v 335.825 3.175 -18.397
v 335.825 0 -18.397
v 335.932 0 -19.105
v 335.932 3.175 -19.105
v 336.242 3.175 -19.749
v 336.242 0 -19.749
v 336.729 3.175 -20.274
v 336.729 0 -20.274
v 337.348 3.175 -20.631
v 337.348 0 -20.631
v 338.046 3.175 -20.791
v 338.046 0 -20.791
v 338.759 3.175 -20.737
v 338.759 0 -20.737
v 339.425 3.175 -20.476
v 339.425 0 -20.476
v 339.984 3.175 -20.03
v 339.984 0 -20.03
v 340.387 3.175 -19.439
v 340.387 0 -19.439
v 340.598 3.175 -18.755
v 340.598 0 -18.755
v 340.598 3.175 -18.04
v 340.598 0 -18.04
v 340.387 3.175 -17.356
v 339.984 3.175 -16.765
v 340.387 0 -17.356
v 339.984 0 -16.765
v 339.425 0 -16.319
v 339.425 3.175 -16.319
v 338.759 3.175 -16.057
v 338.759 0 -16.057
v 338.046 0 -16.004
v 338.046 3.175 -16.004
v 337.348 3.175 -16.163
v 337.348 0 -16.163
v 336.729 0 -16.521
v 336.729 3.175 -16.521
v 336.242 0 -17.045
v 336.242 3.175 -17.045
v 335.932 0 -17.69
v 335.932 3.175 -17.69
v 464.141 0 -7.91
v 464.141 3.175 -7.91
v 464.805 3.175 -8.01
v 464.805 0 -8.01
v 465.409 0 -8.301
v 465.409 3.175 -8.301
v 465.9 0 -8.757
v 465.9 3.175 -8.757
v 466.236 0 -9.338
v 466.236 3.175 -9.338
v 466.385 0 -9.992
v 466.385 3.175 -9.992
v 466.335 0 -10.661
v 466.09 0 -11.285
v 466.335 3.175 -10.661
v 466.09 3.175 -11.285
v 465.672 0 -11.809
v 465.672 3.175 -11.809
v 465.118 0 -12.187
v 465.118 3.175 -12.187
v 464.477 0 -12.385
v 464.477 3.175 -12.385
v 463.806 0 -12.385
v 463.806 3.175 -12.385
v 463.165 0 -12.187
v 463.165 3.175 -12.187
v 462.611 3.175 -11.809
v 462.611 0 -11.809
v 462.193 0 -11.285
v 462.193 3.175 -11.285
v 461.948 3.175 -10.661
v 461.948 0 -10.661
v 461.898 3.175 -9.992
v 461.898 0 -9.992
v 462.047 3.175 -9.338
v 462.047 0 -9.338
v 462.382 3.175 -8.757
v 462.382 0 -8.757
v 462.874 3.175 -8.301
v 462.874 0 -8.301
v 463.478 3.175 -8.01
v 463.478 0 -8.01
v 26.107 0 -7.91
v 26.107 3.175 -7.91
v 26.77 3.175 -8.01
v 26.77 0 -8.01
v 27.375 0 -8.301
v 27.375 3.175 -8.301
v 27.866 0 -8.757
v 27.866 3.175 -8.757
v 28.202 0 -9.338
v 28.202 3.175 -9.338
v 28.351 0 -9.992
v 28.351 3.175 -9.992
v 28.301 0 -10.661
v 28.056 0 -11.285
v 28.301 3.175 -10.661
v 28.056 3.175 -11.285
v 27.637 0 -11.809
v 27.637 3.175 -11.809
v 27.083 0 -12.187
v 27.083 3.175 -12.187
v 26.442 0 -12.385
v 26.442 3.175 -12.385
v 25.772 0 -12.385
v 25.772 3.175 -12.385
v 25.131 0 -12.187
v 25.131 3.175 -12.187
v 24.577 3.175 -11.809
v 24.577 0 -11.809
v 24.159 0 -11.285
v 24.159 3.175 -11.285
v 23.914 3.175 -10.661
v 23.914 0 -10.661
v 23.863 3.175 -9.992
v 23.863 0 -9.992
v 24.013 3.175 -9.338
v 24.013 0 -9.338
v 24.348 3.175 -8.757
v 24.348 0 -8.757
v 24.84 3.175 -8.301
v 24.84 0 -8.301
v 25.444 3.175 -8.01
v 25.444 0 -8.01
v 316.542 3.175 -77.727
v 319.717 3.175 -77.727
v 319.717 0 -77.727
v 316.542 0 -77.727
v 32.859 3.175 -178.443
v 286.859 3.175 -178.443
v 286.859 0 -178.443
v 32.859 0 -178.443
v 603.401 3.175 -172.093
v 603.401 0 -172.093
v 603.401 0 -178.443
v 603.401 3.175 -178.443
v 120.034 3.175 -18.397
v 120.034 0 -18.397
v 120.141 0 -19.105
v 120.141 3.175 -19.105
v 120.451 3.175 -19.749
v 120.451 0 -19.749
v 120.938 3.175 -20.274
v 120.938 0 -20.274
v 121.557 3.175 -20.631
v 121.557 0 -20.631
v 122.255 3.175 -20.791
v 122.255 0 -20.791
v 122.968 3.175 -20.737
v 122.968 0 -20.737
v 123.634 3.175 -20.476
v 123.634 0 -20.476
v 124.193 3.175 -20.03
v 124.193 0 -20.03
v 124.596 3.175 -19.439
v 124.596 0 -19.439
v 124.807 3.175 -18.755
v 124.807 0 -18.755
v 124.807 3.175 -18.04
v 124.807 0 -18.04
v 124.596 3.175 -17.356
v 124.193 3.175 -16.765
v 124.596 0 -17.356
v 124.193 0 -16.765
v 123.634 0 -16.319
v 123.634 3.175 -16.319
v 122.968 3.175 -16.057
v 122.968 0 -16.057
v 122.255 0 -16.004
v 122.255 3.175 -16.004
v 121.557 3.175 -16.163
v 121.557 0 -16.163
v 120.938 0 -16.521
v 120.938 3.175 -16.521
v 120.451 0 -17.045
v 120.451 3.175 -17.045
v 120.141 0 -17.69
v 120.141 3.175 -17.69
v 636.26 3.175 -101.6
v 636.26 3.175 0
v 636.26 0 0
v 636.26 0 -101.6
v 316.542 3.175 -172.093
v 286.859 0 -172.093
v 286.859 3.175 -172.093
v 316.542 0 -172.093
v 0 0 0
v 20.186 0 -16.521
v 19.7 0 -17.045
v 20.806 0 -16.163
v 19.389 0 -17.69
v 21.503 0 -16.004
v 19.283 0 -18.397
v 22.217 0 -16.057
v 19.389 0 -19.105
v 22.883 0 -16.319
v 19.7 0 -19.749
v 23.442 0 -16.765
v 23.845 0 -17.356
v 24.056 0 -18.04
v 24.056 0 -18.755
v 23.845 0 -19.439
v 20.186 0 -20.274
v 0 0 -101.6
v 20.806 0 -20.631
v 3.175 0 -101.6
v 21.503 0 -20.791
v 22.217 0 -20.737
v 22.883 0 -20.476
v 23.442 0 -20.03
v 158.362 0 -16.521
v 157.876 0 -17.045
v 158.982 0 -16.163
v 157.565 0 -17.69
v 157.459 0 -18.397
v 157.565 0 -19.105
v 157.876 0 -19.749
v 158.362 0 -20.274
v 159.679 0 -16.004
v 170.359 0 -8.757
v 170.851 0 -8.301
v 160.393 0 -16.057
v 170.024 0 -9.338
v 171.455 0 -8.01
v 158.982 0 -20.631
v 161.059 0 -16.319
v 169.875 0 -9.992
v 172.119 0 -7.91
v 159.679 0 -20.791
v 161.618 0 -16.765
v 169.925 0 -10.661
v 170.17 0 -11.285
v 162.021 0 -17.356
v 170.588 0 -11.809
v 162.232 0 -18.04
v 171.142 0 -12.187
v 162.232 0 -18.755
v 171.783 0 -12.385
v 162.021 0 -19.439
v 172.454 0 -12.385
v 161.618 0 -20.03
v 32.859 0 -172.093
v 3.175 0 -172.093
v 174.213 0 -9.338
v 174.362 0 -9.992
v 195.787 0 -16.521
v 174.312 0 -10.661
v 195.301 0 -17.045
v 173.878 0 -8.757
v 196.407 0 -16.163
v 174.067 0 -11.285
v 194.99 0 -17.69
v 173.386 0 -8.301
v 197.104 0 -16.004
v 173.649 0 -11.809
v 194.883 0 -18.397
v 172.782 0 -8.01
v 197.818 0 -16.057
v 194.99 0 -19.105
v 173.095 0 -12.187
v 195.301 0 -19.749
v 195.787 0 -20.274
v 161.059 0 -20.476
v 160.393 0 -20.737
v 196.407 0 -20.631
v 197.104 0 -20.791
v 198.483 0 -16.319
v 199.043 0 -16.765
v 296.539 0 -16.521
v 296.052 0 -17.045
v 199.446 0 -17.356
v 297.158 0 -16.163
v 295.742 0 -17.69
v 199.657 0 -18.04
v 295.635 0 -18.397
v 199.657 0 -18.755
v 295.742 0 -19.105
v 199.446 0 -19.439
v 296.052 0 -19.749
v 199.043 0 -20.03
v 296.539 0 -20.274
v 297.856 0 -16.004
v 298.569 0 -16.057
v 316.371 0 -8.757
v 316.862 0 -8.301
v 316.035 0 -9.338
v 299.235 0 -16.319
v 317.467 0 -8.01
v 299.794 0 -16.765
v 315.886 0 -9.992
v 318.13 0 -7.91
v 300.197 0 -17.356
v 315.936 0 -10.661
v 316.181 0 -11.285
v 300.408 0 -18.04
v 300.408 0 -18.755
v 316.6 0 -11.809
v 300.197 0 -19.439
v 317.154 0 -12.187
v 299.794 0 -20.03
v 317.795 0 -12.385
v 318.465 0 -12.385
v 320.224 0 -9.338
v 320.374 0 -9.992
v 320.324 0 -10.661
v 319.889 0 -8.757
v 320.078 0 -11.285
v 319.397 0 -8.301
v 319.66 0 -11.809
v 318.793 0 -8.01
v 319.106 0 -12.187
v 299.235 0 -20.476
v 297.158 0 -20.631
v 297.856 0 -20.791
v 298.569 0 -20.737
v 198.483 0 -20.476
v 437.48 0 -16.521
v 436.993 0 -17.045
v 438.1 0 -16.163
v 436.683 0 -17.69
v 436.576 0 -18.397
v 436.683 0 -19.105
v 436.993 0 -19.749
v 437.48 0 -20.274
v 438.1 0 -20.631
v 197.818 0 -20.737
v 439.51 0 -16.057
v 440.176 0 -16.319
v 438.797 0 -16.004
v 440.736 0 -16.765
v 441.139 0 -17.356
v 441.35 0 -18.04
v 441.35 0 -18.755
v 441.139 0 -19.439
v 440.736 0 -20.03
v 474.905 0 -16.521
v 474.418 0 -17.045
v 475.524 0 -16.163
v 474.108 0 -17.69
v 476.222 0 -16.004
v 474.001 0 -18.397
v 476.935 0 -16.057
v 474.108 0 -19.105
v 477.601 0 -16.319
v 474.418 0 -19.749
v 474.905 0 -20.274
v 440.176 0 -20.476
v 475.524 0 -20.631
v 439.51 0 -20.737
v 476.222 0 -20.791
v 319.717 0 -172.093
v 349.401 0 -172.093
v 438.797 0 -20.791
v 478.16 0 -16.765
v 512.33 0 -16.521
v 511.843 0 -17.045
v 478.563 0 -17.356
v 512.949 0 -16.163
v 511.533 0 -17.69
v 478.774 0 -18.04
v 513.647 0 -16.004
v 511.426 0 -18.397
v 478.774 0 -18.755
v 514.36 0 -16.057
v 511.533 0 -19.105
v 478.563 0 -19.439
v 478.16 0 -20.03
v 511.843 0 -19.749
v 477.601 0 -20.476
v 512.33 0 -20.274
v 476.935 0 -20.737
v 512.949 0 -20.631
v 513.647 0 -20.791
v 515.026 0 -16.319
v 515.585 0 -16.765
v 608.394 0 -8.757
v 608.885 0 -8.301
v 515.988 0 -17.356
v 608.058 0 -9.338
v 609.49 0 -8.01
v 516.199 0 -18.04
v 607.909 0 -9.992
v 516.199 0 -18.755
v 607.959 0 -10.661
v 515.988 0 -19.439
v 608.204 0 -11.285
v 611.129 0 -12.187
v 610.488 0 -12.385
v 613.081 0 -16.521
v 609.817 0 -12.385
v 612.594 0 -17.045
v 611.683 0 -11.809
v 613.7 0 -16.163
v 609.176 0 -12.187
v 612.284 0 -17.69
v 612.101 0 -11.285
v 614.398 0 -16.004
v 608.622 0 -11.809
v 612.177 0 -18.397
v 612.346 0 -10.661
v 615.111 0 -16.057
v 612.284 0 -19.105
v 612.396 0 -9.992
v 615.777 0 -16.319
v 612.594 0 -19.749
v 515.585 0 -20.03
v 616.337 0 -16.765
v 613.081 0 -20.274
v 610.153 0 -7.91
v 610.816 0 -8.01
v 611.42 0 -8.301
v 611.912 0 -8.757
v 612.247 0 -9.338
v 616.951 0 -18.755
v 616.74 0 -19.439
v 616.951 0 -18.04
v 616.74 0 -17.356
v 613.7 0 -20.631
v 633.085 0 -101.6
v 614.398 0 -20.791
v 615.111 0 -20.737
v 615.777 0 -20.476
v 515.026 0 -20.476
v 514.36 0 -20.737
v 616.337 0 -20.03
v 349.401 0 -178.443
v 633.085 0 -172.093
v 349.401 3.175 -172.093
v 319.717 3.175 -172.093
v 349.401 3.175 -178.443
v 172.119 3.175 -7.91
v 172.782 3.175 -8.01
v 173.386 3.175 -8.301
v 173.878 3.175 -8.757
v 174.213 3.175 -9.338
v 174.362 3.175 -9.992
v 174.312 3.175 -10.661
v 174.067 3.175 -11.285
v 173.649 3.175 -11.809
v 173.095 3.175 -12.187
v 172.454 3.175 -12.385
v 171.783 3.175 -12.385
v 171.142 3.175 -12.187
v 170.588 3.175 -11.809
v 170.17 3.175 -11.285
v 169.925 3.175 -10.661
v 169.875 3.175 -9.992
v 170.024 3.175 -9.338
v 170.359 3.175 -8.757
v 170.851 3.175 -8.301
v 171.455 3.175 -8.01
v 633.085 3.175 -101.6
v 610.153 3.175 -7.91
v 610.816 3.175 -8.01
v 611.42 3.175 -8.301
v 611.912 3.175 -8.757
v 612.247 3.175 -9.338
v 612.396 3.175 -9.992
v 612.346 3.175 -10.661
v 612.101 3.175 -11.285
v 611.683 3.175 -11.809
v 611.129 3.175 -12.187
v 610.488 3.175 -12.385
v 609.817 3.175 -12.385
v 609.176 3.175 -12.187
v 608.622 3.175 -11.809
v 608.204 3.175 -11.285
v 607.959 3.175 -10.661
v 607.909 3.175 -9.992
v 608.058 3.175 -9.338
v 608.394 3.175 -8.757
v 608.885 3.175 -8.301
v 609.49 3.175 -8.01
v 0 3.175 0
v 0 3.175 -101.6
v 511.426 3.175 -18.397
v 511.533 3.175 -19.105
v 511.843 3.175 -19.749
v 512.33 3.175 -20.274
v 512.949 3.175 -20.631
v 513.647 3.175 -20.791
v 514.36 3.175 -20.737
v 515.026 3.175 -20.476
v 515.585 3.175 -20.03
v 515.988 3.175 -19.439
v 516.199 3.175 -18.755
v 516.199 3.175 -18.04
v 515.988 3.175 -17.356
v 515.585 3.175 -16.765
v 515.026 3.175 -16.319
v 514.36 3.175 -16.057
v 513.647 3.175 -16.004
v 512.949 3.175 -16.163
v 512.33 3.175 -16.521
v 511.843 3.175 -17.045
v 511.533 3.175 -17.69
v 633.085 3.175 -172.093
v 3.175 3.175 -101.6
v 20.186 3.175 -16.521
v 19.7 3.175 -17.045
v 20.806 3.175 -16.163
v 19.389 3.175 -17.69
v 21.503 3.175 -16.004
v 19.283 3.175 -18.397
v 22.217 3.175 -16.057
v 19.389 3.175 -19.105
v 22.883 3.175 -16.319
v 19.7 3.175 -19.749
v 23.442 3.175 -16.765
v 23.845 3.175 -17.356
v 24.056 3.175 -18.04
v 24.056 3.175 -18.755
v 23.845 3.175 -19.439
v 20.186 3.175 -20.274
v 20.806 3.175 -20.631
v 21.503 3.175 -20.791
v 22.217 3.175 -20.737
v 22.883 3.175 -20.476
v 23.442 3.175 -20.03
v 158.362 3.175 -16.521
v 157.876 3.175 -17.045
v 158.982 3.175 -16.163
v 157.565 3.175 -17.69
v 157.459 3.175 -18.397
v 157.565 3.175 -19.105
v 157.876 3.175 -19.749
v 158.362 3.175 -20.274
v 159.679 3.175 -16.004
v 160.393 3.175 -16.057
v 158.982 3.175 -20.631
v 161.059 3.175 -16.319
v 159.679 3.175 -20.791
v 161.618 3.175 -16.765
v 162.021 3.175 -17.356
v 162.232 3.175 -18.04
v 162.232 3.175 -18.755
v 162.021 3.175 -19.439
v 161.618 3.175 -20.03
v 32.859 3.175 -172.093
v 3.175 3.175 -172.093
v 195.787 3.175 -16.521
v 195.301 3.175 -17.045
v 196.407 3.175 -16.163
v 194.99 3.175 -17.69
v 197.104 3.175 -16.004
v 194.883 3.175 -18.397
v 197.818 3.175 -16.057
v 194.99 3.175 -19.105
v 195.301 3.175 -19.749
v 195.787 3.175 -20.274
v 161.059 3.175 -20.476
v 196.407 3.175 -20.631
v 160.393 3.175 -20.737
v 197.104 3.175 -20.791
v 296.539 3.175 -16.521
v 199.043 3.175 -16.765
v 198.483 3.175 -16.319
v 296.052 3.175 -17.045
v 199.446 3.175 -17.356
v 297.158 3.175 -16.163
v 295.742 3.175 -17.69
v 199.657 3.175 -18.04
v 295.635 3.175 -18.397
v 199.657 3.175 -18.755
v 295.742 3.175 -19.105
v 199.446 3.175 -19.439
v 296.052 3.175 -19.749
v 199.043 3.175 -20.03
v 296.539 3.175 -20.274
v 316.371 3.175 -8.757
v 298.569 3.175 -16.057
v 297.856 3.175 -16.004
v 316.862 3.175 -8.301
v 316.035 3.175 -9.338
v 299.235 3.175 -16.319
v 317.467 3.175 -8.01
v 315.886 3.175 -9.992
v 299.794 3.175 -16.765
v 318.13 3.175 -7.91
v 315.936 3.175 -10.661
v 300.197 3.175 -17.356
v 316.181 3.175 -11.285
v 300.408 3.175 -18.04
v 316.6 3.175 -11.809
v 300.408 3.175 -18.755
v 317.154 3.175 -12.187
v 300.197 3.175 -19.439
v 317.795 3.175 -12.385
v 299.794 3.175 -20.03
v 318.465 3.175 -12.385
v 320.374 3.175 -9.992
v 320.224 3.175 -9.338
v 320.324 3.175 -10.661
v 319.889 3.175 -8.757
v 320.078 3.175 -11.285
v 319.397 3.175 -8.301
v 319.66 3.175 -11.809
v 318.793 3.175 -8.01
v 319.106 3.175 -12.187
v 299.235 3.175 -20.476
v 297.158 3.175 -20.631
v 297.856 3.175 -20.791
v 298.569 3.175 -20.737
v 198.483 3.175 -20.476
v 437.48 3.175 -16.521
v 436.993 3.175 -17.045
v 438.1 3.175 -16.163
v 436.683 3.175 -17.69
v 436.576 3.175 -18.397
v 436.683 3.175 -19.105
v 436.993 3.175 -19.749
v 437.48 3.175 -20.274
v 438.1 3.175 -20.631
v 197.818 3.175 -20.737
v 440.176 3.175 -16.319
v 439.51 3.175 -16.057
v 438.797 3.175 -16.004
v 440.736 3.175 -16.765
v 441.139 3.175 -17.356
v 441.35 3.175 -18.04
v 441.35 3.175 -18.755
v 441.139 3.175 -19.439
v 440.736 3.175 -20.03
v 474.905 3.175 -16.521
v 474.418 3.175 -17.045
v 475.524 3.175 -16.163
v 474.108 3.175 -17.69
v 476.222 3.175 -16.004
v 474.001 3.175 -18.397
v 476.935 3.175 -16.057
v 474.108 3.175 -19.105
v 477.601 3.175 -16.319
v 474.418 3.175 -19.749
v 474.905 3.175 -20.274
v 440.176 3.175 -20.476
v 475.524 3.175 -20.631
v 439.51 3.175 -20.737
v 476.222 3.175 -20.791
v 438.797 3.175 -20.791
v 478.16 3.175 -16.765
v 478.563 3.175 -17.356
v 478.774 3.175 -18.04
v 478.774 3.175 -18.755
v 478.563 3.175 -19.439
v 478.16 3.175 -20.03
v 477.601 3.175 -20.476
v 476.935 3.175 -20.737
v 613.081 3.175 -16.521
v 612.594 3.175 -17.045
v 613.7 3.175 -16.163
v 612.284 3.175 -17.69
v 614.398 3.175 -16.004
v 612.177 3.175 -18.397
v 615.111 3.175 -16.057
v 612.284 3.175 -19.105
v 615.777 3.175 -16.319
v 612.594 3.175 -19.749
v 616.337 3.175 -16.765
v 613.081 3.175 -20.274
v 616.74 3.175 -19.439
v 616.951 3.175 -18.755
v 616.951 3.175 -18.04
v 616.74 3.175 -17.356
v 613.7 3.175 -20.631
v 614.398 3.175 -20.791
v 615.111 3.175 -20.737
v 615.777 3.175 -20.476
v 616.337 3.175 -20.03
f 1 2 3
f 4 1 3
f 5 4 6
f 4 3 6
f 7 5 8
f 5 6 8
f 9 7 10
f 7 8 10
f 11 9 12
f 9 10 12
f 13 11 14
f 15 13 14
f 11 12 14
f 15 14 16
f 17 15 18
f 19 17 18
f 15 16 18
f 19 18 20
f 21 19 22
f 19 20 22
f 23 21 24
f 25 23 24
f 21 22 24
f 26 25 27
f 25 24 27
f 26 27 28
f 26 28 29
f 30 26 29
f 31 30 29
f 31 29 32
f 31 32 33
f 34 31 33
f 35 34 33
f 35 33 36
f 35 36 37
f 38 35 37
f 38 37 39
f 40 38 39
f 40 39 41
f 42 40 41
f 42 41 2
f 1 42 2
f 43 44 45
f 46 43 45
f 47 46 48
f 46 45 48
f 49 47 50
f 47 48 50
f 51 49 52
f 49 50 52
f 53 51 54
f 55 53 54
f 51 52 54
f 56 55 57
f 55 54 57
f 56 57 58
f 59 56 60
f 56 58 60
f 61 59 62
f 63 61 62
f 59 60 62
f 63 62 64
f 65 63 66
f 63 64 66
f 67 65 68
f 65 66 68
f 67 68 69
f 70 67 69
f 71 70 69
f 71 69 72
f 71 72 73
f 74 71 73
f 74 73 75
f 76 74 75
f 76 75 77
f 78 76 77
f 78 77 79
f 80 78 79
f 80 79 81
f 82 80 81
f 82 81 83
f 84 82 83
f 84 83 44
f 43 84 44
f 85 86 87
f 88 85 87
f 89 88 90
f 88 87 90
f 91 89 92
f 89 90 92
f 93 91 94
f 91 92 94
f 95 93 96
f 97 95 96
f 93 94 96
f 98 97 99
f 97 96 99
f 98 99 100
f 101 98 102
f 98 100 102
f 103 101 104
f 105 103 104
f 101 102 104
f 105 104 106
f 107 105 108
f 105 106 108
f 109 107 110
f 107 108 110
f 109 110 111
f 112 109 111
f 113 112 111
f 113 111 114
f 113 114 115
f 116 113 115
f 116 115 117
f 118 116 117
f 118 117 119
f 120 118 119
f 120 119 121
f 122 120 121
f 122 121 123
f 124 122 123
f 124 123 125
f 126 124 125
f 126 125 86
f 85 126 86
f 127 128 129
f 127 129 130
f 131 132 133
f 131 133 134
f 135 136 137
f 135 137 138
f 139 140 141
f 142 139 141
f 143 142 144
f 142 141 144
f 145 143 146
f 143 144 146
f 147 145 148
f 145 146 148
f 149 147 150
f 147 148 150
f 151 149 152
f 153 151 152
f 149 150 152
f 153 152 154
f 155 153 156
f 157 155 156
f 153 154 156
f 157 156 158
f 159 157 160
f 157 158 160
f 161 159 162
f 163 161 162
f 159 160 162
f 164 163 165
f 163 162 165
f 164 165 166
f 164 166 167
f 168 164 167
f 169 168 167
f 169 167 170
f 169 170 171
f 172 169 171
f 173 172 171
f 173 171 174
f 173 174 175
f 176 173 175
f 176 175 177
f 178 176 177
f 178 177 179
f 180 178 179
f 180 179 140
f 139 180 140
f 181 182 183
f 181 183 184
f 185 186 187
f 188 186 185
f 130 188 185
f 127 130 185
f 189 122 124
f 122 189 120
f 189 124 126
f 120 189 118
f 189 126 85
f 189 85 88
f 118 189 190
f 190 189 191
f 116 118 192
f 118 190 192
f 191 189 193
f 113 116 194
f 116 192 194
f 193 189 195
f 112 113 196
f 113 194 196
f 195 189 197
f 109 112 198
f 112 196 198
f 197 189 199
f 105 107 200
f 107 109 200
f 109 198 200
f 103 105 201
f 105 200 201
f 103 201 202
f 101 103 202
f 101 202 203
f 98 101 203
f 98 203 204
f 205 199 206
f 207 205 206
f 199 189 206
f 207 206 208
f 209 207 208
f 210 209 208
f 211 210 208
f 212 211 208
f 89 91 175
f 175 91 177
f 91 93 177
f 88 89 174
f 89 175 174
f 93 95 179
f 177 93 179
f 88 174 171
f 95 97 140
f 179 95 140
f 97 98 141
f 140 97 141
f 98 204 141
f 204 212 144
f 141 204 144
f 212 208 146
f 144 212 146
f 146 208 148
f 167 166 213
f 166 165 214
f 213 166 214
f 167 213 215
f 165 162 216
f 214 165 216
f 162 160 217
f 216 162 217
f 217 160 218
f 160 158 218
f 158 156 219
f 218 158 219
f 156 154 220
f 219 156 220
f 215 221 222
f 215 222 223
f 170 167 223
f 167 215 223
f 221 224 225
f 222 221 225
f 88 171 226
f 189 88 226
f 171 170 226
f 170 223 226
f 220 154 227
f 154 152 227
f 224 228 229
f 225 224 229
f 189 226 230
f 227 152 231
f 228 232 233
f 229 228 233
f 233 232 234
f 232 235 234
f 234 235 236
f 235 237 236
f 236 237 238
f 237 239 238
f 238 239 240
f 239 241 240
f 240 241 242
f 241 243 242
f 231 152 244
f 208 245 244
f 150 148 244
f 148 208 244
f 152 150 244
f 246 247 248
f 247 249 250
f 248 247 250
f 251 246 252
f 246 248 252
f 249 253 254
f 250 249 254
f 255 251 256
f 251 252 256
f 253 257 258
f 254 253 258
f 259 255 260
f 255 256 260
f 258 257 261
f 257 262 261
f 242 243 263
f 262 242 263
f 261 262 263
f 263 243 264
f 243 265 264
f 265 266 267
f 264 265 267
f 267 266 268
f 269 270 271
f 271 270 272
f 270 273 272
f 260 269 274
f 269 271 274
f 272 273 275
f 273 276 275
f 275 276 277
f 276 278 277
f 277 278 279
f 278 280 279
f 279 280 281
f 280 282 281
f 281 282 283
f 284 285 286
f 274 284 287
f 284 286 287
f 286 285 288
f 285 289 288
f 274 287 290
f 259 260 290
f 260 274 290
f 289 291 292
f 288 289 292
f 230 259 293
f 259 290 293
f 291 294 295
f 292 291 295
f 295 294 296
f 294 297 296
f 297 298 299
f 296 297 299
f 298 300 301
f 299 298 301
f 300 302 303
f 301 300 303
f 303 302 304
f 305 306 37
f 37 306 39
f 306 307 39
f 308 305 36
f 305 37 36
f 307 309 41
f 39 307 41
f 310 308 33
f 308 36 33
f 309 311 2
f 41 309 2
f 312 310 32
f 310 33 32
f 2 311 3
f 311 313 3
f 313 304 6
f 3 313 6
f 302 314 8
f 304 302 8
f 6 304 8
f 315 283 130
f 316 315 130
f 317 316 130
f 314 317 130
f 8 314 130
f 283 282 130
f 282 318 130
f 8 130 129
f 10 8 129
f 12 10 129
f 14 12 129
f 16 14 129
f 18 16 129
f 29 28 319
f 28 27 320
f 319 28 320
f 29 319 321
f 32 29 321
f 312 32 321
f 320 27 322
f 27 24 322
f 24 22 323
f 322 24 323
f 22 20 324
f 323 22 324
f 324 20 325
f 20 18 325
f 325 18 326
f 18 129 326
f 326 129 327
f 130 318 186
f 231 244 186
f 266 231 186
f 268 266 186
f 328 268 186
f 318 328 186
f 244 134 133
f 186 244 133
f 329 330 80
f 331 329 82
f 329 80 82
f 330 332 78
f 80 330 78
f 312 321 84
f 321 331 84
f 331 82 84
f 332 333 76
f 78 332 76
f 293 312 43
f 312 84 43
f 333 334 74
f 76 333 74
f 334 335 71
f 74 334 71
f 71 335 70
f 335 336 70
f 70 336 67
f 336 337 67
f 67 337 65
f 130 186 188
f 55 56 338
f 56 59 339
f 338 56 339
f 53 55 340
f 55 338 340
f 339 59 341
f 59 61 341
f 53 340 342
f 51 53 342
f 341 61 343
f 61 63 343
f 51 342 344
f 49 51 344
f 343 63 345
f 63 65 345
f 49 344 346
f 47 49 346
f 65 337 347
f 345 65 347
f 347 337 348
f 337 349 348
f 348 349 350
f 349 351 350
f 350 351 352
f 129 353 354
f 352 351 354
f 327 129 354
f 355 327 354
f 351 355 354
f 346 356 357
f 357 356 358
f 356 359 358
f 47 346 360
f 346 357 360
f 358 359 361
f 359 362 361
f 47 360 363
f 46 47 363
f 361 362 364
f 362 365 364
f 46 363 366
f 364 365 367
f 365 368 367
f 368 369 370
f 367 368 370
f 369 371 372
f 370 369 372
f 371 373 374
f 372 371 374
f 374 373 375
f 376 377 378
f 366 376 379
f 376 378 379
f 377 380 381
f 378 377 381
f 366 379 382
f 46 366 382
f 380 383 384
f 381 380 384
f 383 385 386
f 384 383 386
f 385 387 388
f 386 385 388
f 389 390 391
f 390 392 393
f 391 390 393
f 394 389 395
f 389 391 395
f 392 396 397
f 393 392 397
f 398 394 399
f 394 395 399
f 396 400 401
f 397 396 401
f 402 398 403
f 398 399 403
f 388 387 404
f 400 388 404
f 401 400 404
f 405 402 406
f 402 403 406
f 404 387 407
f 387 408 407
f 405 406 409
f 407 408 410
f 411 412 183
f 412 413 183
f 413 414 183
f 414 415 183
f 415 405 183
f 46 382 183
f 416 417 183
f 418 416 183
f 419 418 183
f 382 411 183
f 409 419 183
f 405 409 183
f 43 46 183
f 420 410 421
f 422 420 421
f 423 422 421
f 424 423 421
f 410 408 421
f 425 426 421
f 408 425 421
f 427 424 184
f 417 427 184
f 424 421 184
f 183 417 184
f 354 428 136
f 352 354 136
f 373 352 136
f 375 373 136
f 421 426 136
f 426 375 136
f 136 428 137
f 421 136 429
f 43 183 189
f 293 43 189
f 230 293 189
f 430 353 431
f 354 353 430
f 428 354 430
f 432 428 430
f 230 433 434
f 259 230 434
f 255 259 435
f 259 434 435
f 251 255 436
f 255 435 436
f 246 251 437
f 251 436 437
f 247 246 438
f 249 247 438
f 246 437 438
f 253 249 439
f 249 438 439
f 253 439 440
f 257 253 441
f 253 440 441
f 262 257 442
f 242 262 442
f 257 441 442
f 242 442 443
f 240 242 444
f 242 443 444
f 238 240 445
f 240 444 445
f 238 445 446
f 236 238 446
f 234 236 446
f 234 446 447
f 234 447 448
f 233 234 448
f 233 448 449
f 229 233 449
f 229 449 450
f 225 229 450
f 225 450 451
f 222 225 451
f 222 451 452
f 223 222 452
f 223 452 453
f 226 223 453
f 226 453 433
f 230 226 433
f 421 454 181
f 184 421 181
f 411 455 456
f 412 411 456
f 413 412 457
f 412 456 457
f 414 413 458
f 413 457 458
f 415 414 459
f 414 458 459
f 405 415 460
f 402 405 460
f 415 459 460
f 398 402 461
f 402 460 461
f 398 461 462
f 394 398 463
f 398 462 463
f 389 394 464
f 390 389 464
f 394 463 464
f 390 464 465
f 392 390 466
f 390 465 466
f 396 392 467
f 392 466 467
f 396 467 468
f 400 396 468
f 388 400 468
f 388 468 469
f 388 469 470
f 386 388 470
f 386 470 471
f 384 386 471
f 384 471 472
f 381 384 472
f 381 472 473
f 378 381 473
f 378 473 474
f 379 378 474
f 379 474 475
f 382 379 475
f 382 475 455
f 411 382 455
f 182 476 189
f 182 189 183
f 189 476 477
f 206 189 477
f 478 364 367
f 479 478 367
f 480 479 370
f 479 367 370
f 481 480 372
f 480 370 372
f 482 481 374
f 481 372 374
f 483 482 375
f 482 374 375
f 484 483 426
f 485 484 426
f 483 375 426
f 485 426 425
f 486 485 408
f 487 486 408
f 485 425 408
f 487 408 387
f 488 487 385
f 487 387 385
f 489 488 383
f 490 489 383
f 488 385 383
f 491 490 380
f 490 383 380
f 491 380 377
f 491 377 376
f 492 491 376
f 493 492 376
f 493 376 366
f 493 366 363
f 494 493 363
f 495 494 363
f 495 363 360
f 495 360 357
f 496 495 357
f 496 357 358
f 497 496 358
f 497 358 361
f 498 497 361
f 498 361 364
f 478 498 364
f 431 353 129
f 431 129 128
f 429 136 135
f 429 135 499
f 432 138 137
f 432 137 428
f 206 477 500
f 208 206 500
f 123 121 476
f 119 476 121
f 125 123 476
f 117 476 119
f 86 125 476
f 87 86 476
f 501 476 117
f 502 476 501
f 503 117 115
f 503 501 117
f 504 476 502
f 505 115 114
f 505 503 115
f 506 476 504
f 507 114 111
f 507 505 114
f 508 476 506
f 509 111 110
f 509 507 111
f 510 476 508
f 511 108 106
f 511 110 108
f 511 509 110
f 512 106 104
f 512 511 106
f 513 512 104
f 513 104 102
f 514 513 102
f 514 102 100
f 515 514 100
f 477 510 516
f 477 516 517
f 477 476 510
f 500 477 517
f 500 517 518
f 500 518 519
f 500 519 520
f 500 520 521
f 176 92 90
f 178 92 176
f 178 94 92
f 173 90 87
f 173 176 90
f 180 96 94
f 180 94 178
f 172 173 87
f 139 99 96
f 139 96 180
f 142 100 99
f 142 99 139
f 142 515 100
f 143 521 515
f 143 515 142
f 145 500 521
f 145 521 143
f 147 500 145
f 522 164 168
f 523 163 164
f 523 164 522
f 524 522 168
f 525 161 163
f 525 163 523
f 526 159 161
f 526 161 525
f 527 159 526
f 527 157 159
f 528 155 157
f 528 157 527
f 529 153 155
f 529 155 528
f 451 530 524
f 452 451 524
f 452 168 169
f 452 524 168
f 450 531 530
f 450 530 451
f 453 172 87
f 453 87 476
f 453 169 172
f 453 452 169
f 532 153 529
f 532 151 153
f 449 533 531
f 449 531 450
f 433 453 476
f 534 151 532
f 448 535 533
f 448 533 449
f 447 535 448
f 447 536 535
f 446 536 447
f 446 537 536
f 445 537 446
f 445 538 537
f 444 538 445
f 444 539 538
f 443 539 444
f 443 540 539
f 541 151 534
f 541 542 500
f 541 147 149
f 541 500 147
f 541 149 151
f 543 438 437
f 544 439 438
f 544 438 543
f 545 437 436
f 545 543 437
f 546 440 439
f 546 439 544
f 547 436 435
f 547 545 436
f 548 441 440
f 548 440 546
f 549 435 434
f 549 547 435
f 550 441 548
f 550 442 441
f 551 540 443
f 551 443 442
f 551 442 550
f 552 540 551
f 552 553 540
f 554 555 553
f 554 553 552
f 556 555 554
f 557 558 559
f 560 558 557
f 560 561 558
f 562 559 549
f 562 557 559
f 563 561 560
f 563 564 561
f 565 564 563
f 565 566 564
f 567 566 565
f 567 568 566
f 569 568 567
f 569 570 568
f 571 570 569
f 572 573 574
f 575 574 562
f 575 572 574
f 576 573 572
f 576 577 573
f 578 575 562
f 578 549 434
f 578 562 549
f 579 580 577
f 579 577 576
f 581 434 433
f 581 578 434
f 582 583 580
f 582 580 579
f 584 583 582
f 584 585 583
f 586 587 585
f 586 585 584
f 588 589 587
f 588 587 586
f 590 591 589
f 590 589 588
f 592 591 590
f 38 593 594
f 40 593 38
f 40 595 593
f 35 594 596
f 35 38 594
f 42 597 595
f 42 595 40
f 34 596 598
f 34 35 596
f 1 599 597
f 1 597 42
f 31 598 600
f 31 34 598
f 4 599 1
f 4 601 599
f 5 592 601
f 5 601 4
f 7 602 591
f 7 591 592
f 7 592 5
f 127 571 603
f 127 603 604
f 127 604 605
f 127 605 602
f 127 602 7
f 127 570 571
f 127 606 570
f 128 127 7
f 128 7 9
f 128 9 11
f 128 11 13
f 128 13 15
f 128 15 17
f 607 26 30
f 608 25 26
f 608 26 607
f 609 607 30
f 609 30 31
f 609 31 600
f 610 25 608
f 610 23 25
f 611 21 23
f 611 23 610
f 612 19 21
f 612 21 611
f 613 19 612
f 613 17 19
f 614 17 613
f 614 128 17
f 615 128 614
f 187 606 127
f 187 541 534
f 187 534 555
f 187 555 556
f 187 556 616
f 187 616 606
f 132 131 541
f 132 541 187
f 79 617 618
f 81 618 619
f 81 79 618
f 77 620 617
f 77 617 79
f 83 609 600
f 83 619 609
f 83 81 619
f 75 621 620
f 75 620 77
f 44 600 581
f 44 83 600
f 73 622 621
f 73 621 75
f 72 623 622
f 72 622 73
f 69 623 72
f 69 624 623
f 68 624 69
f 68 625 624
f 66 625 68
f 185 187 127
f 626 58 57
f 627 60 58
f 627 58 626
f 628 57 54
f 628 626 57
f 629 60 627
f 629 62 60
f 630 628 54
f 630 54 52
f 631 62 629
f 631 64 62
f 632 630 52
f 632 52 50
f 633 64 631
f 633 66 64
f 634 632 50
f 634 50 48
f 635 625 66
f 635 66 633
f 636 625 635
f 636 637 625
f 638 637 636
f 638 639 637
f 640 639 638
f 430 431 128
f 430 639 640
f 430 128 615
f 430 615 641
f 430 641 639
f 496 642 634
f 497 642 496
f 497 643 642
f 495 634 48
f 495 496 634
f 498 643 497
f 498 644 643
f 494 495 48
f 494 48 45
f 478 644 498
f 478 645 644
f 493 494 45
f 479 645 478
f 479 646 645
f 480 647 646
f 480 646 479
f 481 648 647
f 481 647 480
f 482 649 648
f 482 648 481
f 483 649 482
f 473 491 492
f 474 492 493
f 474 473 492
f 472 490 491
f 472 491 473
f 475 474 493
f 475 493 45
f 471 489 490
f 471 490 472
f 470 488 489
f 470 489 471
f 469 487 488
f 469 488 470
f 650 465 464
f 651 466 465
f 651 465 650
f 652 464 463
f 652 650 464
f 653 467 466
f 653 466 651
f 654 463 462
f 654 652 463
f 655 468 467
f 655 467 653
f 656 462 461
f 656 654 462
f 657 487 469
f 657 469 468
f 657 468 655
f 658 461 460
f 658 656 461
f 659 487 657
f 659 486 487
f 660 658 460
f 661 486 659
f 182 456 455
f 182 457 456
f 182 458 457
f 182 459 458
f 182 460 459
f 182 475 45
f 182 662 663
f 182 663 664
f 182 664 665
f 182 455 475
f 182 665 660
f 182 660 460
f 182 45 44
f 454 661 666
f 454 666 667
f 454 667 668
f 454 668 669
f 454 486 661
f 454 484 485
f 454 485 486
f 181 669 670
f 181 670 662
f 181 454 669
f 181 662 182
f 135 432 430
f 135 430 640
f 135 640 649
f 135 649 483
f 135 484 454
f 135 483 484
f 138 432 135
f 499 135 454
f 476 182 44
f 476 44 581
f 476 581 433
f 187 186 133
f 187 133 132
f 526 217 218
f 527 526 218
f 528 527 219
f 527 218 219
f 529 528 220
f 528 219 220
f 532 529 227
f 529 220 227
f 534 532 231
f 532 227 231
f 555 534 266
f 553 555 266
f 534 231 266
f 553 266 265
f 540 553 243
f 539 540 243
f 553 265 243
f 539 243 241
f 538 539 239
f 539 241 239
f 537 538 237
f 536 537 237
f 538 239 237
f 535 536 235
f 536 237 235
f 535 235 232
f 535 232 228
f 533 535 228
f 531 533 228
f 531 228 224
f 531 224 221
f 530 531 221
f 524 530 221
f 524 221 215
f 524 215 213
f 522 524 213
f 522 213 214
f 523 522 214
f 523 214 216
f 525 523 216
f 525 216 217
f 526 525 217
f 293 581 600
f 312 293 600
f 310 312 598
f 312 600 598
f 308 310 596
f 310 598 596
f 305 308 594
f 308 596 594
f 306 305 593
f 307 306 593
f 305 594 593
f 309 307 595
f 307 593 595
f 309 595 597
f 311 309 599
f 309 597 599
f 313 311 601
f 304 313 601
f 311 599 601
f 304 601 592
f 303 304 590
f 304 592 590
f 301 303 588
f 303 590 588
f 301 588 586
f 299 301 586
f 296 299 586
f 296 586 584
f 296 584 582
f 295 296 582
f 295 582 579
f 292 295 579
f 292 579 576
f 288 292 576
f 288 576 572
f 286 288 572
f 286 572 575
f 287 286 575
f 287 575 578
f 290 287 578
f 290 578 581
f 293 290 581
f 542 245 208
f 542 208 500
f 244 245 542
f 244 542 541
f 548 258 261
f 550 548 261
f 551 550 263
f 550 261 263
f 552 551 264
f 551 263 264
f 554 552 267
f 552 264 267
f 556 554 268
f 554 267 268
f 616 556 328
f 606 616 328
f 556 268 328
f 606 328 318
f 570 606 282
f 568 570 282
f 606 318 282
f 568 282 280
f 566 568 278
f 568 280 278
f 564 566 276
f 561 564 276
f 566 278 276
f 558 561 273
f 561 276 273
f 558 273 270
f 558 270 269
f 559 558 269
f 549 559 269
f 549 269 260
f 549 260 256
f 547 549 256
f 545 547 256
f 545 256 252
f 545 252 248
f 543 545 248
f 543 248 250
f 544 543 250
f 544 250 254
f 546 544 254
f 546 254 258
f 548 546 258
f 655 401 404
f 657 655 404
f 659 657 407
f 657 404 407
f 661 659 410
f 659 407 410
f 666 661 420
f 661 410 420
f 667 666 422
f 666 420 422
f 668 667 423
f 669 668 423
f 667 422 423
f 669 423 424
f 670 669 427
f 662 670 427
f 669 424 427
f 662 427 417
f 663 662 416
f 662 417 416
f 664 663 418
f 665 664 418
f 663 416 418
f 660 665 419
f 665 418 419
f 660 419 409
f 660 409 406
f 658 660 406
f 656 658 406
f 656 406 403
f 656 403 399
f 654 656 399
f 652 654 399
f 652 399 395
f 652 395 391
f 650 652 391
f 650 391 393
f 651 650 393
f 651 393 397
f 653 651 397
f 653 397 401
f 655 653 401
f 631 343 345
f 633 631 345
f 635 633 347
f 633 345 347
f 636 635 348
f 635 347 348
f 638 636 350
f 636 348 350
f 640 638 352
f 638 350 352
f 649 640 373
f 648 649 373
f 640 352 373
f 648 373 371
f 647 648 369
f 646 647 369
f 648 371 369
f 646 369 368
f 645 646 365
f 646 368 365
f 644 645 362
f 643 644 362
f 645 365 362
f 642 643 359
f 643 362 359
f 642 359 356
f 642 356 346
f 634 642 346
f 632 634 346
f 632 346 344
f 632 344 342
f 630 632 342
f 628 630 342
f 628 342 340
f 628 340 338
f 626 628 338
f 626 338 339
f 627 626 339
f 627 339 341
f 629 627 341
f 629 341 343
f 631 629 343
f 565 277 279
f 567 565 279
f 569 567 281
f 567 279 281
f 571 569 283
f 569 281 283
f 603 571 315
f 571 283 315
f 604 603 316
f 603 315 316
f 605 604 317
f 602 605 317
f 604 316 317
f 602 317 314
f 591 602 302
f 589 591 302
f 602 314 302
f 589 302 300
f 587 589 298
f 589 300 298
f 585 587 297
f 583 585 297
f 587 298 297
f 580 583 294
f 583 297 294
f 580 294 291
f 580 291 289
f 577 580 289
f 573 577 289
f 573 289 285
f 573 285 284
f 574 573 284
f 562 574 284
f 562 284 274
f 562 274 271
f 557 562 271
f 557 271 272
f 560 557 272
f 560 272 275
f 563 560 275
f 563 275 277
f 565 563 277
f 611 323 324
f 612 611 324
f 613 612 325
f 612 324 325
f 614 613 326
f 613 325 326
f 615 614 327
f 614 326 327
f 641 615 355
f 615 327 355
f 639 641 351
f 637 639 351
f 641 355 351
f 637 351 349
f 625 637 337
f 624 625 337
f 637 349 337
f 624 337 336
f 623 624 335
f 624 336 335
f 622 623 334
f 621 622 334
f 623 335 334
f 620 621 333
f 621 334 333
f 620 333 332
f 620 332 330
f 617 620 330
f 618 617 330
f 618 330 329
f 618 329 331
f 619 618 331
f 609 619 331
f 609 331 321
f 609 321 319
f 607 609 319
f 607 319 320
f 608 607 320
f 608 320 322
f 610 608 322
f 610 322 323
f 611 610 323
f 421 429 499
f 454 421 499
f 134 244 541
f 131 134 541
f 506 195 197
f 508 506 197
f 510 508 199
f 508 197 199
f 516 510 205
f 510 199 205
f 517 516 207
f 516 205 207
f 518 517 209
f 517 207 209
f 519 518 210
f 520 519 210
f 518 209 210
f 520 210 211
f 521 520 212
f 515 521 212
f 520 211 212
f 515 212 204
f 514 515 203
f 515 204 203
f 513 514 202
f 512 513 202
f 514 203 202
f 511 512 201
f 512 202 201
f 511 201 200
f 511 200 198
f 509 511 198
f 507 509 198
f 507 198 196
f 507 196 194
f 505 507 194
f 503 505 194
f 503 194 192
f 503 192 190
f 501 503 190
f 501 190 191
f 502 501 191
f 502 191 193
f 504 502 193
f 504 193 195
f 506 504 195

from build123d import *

# Parameters (mm, degrees)
SKETCH1_W            = 636.25984
SKETCH1_H            = 172.09262
BOSS_EXTRUDE1_DEPTH  = 3.175
SKETCH2_W            = 3.175
SKETCH2_H            = 3.175
CUT_EXTRUDE1_DEPTH   = 94.36608
SKETCH3_W            = 3.175
SKETCH3_H            = 3.175
CUT_EXTRUDE5_DEPTH   = 70.49262
SKETCH4_W            = 636.25984
SKETCH4_H            = 24.39416
CUT_EXTRUDE6_DEPTH   = 660.130134708
SKETCH6_W            = 636.25984
SKETCH6_H            = 24.39416
BOSS_EXTRUDE2_DEPTH  = 3.175
SKETCH7_W            = 254
SKETCH7_H            = 3.175
BOSS_EXTRUDE3_DEPTH  = 6.35
SKETCH8_R            = 2.25
CUT_EXTRUDE7_DEPTH   = 661.816489847
M4_CLEARANCE_HOLE1_D = 4.8


with BuildPart() as part:
    # Sketch1 → Boss-Extrude1 (new body)
    with BuildSketch(Plane(origin=(0, 0, 0), x_dir=(1, 0, 0), z_dir=(0, 1, 0))):
        with Locations((318.12992, 86.04631)):
            Rectangle(SKETCH1_W, SKETCH1_H)
    extrude(amount=BOSS_EXTRUDE1_DEPTH)

    # Sketch2 → Cut-Extrude1 (cut)
    with BuildSketch(Plane(origin=(0, 0, -172.09262), x_dir=(-1, 0, 0), z_dir=(0, 0, -1))):
        with Locations((-318.12992, 1.5875)):
            Rectangle(SKETCH2_W, SKETCH2_H)
    extrude(amount=-CUT_EXTRUDE1_DEPTH, mode=Mode.SUBTRACT)

    # Sketch3 → Cut-Extrude5 (cut)
    with BuildSketch(Plane.XY.offset(-172.09262)):
        with Locations((1.5875, 1.5875)):
            Rectangle(SKETCH3_W, SKETCH3_H)
        with Locations((634.67234, 1.5875)):
            Rectangle(SKETCH3_W, SKETCH3_H)
    extrude(amount=CUT_EXTRUDE5_DEPTH, mode=Mode.SUBTRACT)

    # Sketch4 → Cut-Extrude6 (cut, through all)
    with BuildSketch(Plane(origin=(0, 3.175, 0), x_dir=(1, 0, 0), z_dir=(0, 1, 0))):
        with Locations((318.12992, 12.19708)):
            Rectangle(SKETCH4_W, SKETCH4_H)
    extrude(amount=-CUT_EXTRUDE6_DEPTH, mode=Mode.SUBTRACT)

    # Sketch6 → Boss-Extrude2 (add, through all)
    with BuildSketch(Plane(origin=(0, 3.175, 0), x_dir=(1, 0, 0), z_dir=(0, 1, 0))):
        with Locations((318.12992, 12.19708)):
            Rectangle(SKETCH6_W, SKETCH6_H)
    extrude(amount=-BOSS_EXTRUDE2_DEPTH)

    # Sketch7 → Boss-Extrude3 (add)
    with BuildSketch(Plane(origin=(0, 0, -172.09262), x_dir=(-1, 0, 0), z_dir=(0, 0, -1))):
        with Locations((-476.40113, 1.5875)):
            Rectangle(SKETCH7_W, SKETCH7_H)
        with Locations((-159.85871, 1.5875)):
            Rectangle(SKETCH7_W, SKETCH7_H)
    extrude(amount=BOSS_EXTRUDE3_DEPTH)

    # Sketch8 → Cut-Extrude7 (cut, through all)
    with BuildSketch(Plane(origin=(0, 3.175, 0), x_dir=(1, 0, 0), z_dir=(0, 1, 0))):
        with Locations(Location((26.107106781, 10.16, 0), (0, 0, 270))):
            Circle(SKETCH8_R)
        with Locations(Location((172.118513391, 10.16, 0), (0, 0, 270))):
            Circle(SKETCH8_R)
        with Locations(Location((318.12992, 10.16, 0), (0, 0, 270))):
            Circle(SKETCH8_R)
        with Locations(Location((464.141326609, 10.16, 0), (0, 0, 270))):
            Circle(SKETCH8_R)
        with Locations(Location((610.152733219, 10.16, 0), (0, 0, 270))):
            Circle(SKETCH8_R)
    extrude(amount=-CUT_EXTRUDE7_DEPTH, mode=Mode.SUBTRACT)

    # M4 Clearance Hole1 (through all)
    with Locations(Plane(origin=(0, 3.175, 0), x_dir=(1, 0, 0), z_dir=(0, 1, 0))):
        with Locations((21.682533496, 18.397319949), (122.433944248, 18.397319949), (159.85871, 18.397319949), (197.283475752, 18.397319949), (298.034886505, 18.397319949), (338.224953495, 18.397319949), (438.976364248, 18.397319949), (476.40113, 18.397319949), (513.825895752, 18.397319949), (614.577306504, 18.397319949)):
            Hole(M4_CLEARANCE_HOLE1_D / 2)


solid = part.part
